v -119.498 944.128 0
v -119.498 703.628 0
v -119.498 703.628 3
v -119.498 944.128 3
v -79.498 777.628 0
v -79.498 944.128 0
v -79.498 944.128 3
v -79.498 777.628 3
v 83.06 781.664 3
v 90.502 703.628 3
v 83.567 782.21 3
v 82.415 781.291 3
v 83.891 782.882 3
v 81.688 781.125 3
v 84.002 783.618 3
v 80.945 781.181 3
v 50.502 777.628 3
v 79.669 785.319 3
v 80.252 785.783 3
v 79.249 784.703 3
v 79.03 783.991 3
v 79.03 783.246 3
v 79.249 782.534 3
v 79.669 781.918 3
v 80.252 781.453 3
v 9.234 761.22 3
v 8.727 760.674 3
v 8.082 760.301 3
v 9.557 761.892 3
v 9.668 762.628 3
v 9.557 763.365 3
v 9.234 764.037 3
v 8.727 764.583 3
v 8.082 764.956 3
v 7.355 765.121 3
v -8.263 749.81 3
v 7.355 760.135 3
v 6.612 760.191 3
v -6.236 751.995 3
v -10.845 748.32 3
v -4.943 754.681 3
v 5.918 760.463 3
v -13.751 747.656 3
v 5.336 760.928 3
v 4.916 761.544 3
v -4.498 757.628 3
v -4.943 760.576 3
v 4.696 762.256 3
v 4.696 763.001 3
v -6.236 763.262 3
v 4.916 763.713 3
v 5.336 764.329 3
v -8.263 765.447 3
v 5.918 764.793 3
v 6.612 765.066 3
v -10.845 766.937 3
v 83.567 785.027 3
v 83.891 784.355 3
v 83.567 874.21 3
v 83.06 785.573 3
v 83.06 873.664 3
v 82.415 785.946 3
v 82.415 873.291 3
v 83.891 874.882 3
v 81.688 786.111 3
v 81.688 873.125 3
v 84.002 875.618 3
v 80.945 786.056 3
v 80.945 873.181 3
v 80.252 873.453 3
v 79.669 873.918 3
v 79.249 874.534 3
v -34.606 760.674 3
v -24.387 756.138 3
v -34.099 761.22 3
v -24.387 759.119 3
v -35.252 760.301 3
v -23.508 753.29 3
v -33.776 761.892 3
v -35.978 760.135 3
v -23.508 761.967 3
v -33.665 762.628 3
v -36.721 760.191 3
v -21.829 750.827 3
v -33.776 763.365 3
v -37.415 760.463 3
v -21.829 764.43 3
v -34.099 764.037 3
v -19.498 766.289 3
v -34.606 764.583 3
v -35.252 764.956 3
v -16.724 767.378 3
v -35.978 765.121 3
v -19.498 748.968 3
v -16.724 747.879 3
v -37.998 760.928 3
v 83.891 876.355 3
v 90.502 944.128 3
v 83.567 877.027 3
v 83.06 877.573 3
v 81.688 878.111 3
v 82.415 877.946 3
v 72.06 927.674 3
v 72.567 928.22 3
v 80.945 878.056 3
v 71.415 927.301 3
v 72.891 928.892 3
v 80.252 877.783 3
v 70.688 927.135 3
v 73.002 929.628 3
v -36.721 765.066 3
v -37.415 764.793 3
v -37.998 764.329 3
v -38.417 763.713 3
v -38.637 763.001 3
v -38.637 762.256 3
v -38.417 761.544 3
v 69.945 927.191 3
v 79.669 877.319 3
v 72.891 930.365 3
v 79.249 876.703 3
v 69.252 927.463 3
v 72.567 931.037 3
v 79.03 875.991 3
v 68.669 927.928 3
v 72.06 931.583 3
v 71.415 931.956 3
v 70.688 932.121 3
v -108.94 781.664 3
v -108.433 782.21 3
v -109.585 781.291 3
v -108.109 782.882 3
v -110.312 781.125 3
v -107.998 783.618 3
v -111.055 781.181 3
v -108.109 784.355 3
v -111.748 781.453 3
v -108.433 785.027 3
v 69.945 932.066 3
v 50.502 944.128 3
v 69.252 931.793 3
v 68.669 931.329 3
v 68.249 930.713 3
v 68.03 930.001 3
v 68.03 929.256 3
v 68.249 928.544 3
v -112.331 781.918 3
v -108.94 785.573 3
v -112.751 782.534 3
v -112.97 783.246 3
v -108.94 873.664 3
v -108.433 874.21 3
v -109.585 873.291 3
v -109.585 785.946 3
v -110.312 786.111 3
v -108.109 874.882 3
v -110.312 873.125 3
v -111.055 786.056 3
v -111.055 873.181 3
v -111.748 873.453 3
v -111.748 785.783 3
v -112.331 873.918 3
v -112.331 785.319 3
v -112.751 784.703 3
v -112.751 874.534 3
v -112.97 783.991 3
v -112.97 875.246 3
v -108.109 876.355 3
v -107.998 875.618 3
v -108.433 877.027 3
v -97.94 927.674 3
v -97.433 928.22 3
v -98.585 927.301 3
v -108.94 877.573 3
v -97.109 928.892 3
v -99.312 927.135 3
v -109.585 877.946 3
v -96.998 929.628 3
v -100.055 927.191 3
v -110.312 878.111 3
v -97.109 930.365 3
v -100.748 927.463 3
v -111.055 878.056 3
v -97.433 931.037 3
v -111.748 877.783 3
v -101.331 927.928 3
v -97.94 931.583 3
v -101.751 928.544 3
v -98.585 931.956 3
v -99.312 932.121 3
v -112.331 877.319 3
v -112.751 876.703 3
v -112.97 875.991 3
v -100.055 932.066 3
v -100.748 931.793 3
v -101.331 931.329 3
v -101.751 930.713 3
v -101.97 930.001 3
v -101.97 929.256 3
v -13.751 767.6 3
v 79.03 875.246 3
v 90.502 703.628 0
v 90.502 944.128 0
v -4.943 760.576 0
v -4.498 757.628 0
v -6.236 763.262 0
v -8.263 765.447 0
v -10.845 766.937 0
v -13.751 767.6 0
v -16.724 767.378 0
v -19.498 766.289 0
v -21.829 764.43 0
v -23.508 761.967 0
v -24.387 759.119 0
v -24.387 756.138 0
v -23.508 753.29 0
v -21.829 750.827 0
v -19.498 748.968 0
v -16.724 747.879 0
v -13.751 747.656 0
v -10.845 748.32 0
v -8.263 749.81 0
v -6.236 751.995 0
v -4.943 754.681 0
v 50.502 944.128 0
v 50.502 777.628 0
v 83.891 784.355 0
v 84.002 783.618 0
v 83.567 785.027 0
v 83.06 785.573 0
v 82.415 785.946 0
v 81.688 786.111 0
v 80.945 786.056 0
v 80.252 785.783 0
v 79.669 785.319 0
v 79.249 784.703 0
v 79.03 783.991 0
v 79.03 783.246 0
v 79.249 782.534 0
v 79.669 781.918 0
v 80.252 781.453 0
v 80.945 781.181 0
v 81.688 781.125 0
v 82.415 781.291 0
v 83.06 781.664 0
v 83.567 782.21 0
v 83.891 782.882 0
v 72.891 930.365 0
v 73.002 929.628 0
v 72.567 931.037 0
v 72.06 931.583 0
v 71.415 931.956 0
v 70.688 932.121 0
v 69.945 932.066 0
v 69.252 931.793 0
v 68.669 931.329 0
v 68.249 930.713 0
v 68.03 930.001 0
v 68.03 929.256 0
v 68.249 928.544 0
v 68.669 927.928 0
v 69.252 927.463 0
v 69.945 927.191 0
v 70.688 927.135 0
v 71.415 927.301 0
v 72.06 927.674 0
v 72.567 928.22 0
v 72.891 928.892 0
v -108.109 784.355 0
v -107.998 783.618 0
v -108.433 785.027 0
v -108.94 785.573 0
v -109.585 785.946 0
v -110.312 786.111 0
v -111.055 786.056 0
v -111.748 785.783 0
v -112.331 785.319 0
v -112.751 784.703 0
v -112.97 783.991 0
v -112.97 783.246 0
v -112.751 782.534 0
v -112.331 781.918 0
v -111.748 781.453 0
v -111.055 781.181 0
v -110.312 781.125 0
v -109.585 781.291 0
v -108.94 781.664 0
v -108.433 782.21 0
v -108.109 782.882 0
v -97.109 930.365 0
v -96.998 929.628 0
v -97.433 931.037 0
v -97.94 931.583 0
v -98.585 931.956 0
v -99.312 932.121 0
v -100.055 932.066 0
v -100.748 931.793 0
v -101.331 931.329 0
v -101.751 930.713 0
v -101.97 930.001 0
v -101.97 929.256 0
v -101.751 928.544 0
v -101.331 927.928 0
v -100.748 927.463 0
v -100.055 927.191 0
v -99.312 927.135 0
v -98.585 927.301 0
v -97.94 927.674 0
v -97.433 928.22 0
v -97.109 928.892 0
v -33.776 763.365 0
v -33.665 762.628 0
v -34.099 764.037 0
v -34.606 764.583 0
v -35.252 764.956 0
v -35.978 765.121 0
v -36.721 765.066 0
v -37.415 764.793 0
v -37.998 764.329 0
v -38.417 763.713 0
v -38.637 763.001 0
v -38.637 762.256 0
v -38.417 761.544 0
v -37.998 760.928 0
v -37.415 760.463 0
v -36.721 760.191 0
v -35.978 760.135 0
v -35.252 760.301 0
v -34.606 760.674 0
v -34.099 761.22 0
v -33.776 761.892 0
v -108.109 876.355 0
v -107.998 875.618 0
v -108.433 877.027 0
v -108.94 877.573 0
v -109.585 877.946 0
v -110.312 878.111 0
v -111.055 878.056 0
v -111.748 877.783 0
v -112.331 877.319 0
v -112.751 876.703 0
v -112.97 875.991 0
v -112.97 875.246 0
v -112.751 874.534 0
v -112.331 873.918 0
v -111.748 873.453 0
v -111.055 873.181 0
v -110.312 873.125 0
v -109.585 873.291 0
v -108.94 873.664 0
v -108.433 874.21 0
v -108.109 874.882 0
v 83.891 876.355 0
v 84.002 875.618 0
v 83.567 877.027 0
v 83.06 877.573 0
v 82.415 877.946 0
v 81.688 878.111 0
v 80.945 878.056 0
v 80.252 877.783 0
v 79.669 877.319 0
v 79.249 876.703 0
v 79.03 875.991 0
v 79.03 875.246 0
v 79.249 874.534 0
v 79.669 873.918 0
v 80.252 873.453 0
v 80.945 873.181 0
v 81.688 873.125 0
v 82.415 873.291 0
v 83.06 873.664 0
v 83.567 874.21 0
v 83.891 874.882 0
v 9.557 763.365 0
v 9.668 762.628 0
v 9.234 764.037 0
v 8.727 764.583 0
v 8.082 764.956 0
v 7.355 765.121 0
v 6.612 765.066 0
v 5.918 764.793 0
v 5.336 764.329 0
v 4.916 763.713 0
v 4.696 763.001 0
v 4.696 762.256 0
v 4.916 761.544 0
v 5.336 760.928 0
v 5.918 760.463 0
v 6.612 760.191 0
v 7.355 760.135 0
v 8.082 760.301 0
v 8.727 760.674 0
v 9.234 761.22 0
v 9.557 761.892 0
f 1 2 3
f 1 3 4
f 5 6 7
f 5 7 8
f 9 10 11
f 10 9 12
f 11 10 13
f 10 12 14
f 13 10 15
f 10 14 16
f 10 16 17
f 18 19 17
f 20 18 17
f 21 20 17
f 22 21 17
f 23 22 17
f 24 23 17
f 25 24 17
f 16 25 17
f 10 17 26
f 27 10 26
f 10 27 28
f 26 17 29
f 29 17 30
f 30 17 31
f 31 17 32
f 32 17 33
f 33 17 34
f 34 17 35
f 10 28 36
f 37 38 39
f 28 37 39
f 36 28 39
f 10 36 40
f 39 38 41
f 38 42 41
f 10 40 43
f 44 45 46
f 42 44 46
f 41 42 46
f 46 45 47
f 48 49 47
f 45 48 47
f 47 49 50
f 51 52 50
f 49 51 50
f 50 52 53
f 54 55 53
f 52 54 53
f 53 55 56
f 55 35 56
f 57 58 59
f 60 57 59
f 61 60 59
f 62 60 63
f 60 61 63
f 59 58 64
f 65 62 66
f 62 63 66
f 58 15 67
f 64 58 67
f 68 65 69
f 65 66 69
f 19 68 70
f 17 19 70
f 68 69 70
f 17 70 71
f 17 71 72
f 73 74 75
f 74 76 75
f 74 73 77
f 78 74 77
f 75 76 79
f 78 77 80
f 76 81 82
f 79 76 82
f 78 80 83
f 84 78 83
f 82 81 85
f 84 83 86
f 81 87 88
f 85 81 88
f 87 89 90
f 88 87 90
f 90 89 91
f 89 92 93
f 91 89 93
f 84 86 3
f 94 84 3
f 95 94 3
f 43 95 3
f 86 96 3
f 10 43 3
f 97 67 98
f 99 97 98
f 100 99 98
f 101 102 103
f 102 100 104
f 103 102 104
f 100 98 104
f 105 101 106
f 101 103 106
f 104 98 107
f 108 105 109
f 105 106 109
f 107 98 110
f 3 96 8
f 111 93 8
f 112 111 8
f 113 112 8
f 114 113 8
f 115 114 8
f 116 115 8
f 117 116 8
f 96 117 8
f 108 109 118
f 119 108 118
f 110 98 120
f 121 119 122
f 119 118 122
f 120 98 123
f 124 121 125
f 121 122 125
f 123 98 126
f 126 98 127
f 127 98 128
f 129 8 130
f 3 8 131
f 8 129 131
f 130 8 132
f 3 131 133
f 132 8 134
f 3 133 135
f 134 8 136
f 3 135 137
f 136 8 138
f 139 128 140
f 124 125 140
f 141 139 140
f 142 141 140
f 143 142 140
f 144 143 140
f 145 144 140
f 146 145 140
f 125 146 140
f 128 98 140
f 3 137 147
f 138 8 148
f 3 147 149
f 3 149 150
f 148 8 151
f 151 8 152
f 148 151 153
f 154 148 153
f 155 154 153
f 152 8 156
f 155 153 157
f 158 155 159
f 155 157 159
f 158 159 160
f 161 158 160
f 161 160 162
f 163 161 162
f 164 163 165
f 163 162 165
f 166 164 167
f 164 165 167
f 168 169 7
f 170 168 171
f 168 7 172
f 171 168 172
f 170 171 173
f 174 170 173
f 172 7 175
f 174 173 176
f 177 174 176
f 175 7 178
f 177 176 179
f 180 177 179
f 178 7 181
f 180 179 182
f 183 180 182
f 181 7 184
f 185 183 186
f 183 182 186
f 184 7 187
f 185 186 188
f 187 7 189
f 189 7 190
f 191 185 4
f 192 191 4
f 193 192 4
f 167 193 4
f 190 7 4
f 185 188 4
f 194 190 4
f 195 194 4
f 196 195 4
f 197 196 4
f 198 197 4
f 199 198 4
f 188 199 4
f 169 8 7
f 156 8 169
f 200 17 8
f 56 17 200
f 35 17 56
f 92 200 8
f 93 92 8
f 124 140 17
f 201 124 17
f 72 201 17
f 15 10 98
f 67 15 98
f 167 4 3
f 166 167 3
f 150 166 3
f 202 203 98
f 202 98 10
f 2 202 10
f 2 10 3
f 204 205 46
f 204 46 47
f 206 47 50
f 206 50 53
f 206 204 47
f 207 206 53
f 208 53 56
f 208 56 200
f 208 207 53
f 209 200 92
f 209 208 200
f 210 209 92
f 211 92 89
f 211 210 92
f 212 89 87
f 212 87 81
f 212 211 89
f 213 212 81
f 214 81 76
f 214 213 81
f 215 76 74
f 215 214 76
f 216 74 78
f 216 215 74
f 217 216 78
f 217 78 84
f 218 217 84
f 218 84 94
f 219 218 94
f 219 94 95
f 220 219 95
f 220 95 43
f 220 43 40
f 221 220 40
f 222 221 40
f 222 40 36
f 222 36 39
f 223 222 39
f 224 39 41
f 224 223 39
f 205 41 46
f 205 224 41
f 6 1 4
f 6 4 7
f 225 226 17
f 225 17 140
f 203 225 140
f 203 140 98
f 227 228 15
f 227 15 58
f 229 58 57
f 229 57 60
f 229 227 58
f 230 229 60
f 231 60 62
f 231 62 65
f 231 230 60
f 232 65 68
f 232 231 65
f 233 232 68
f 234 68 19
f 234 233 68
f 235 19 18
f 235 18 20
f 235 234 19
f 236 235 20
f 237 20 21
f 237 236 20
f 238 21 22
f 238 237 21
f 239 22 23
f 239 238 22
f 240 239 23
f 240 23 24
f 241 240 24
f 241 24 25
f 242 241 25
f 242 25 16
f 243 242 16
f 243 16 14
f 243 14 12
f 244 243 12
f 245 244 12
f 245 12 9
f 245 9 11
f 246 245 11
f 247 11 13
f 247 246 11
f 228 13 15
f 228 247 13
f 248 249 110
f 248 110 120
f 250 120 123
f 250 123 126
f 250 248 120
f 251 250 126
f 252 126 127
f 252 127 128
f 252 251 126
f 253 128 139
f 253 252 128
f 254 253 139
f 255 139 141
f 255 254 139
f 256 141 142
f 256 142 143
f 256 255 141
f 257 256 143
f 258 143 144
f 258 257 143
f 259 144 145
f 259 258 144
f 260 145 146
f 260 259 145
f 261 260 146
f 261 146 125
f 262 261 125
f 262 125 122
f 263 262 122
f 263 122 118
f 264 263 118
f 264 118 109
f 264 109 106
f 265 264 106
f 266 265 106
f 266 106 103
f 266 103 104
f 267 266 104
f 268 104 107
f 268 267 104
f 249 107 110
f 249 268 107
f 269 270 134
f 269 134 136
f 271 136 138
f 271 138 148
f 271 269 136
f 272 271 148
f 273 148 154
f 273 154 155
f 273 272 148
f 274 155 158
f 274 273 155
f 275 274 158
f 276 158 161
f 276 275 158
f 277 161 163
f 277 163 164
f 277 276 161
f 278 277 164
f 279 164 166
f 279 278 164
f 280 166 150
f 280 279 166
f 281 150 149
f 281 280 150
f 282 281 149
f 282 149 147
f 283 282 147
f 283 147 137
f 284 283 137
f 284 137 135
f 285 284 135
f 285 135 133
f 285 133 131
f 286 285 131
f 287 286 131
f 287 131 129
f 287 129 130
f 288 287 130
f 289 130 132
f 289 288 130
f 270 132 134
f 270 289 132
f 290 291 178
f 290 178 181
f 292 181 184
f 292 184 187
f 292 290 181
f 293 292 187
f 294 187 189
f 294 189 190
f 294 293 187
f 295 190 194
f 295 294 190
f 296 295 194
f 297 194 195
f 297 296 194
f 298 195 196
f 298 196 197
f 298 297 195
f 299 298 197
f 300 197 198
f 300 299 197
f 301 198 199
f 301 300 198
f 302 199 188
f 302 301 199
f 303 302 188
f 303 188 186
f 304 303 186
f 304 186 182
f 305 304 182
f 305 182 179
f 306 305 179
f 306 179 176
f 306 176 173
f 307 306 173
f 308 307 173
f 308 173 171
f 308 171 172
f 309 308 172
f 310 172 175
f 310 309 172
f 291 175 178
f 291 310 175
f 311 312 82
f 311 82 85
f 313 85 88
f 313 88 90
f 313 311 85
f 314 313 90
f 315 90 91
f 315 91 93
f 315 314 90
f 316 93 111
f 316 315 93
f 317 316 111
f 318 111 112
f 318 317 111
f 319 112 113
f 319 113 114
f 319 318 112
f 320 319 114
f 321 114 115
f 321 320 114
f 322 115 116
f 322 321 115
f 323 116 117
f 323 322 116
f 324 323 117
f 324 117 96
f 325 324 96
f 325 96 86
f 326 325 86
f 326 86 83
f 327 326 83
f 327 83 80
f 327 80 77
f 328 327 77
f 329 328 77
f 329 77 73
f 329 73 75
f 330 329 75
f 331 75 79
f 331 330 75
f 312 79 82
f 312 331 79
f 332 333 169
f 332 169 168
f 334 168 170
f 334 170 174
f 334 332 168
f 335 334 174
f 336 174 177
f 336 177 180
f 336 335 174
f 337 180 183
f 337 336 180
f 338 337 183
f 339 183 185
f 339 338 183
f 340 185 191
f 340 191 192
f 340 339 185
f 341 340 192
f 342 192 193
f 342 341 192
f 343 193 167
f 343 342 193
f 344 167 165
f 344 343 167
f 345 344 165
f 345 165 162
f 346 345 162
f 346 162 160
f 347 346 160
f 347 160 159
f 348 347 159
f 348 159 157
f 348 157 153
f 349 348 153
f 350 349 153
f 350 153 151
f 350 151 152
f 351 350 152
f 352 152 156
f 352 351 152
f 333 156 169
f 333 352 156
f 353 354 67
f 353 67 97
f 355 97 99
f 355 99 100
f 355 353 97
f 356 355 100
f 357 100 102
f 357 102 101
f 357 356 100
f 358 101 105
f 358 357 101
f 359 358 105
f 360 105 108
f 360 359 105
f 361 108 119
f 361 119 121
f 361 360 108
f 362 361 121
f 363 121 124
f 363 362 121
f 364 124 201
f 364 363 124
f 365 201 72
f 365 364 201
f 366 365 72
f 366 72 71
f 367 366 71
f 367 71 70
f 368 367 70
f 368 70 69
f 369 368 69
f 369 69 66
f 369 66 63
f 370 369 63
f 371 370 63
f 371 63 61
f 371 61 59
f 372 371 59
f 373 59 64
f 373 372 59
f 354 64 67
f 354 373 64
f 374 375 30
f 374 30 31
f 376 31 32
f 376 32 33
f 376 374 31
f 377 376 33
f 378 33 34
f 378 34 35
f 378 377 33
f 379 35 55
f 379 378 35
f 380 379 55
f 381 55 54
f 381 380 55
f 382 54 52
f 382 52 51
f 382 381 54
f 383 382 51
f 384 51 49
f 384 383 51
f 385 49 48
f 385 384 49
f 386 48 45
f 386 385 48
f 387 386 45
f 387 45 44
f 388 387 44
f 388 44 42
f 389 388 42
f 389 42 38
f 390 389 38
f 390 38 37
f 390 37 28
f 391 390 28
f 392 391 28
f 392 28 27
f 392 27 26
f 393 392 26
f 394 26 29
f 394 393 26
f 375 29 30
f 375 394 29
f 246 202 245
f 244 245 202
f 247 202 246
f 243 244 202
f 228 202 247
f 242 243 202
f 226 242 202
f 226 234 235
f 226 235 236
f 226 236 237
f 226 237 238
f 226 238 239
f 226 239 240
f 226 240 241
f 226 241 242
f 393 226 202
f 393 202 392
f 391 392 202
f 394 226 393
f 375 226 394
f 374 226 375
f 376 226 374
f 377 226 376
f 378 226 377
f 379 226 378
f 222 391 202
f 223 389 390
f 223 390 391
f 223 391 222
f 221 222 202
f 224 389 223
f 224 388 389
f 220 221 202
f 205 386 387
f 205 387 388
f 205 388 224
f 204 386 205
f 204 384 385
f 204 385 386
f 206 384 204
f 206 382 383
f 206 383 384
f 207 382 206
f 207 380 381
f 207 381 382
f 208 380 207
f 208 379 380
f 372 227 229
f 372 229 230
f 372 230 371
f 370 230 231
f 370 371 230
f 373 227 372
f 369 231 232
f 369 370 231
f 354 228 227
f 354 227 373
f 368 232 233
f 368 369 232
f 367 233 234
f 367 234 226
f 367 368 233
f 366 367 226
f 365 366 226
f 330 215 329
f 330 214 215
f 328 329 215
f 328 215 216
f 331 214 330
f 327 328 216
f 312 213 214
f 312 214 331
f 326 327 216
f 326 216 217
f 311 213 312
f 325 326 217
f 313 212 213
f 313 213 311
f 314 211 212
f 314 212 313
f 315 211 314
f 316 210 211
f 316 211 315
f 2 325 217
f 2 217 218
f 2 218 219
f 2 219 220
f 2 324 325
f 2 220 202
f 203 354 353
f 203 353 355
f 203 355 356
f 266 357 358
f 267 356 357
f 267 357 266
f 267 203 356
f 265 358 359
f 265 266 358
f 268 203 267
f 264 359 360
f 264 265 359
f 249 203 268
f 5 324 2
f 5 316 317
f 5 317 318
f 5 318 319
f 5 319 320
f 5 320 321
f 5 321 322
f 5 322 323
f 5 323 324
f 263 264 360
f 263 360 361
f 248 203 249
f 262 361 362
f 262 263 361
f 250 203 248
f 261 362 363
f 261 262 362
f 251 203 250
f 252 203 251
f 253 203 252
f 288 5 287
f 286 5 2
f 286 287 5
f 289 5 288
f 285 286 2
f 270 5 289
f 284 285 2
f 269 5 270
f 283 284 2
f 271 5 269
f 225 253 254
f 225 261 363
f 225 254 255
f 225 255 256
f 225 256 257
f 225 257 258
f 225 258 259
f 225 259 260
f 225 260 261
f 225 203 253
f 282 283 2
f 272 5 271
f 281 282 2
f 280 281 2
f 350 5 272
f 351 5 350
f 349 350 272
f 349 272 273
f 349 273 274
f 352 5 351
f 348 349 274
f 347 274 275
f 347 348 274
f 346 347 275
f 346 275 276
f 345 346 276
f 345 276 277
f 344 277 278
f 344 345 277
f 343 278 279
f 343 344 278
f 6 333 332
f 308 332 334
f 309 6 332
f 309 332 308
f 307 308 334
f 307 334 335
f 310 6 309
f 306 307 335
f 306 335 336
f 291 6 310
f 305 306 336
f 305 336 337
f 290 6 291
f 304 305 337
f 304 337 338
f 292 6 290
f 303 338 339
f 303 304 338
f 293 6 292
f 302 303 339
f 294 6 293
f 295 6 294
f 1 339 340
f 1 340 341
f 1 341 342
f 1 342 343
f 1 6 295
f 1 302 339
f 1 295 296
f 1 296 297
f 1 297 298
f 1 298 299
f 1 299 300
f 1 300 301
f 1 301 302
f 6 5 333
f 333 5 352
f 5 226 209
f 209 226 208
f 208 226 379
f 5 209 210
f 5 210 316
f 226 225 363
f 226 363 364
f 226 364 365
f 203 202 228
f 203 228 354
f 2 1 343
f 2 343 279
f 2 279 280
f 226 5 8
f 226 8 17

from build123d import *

# Parameters (mm, degrees)
CROQUIS1_R              = 2.5
CROQUIS1_R_2            = 10
SALIENTE_EXTRUIR1_DEPTH = 3


with BuildPart() as part:
    # Croquis1 → Saliente-Extruir1 (new body)
    with BuildSketch(Plane.XY):
        Polygon((-79.498385096, 944.128389678), (-79.498385096, 777.628389678), (50.501614904, 777.628389678), (50.501614904, 944.128389678), (90.501614904, 944.128389678), (90.501614904, 703.628389678), (-119.498385096, 703.628389678), (-119.498385096, 944.128389678), align=None)
        with Locations((70.501614904, 929.628389678)):
            Circle(CROQUIS1_R, mode=Mode.SUBTRACT)
        with Locations((81.501614904, 875.618389678)):
            Circle(CROQUIS1_R, mode=Mode.SUBTRACT)
        with Locations((81.501614904, 783.618389678)):
            Circle(CROQUIS1_R, mode=Mode.SUBTRACT)
        with Locations((-36.165051763, 762.628389678)):
            Circle(CROQUIS1_R, mode=Mode.SUBTRACT)
        with Locations((-110.498385096, 783.618389678)):
            Circle(CROQUIS1_R, mode=Mode.SUBTRACT)
        with Locations((-110.498385096, 875.618389678)):
            Circle(CROQUIS1_R, mode=Mode.SUBTRACT)
        with Locations((-99.498385096, 929.628389678)):
            Circle(CROQUIS1_R, mode=Mode.SUBTRACT)
        with Locations((7.168281571, 762.628389678)):
            Circle(CROQUIS1_R, mode=Mode.SUBTRACT)
        with Locations((-14.498385096, 757.628389678)):
            Circle(CROQUIS1_R_2, mode=Mode.SUBTRACT)
    extrude(amount=SALIENTE_EXTRUIR1_DEPTH)


solid = part.part
